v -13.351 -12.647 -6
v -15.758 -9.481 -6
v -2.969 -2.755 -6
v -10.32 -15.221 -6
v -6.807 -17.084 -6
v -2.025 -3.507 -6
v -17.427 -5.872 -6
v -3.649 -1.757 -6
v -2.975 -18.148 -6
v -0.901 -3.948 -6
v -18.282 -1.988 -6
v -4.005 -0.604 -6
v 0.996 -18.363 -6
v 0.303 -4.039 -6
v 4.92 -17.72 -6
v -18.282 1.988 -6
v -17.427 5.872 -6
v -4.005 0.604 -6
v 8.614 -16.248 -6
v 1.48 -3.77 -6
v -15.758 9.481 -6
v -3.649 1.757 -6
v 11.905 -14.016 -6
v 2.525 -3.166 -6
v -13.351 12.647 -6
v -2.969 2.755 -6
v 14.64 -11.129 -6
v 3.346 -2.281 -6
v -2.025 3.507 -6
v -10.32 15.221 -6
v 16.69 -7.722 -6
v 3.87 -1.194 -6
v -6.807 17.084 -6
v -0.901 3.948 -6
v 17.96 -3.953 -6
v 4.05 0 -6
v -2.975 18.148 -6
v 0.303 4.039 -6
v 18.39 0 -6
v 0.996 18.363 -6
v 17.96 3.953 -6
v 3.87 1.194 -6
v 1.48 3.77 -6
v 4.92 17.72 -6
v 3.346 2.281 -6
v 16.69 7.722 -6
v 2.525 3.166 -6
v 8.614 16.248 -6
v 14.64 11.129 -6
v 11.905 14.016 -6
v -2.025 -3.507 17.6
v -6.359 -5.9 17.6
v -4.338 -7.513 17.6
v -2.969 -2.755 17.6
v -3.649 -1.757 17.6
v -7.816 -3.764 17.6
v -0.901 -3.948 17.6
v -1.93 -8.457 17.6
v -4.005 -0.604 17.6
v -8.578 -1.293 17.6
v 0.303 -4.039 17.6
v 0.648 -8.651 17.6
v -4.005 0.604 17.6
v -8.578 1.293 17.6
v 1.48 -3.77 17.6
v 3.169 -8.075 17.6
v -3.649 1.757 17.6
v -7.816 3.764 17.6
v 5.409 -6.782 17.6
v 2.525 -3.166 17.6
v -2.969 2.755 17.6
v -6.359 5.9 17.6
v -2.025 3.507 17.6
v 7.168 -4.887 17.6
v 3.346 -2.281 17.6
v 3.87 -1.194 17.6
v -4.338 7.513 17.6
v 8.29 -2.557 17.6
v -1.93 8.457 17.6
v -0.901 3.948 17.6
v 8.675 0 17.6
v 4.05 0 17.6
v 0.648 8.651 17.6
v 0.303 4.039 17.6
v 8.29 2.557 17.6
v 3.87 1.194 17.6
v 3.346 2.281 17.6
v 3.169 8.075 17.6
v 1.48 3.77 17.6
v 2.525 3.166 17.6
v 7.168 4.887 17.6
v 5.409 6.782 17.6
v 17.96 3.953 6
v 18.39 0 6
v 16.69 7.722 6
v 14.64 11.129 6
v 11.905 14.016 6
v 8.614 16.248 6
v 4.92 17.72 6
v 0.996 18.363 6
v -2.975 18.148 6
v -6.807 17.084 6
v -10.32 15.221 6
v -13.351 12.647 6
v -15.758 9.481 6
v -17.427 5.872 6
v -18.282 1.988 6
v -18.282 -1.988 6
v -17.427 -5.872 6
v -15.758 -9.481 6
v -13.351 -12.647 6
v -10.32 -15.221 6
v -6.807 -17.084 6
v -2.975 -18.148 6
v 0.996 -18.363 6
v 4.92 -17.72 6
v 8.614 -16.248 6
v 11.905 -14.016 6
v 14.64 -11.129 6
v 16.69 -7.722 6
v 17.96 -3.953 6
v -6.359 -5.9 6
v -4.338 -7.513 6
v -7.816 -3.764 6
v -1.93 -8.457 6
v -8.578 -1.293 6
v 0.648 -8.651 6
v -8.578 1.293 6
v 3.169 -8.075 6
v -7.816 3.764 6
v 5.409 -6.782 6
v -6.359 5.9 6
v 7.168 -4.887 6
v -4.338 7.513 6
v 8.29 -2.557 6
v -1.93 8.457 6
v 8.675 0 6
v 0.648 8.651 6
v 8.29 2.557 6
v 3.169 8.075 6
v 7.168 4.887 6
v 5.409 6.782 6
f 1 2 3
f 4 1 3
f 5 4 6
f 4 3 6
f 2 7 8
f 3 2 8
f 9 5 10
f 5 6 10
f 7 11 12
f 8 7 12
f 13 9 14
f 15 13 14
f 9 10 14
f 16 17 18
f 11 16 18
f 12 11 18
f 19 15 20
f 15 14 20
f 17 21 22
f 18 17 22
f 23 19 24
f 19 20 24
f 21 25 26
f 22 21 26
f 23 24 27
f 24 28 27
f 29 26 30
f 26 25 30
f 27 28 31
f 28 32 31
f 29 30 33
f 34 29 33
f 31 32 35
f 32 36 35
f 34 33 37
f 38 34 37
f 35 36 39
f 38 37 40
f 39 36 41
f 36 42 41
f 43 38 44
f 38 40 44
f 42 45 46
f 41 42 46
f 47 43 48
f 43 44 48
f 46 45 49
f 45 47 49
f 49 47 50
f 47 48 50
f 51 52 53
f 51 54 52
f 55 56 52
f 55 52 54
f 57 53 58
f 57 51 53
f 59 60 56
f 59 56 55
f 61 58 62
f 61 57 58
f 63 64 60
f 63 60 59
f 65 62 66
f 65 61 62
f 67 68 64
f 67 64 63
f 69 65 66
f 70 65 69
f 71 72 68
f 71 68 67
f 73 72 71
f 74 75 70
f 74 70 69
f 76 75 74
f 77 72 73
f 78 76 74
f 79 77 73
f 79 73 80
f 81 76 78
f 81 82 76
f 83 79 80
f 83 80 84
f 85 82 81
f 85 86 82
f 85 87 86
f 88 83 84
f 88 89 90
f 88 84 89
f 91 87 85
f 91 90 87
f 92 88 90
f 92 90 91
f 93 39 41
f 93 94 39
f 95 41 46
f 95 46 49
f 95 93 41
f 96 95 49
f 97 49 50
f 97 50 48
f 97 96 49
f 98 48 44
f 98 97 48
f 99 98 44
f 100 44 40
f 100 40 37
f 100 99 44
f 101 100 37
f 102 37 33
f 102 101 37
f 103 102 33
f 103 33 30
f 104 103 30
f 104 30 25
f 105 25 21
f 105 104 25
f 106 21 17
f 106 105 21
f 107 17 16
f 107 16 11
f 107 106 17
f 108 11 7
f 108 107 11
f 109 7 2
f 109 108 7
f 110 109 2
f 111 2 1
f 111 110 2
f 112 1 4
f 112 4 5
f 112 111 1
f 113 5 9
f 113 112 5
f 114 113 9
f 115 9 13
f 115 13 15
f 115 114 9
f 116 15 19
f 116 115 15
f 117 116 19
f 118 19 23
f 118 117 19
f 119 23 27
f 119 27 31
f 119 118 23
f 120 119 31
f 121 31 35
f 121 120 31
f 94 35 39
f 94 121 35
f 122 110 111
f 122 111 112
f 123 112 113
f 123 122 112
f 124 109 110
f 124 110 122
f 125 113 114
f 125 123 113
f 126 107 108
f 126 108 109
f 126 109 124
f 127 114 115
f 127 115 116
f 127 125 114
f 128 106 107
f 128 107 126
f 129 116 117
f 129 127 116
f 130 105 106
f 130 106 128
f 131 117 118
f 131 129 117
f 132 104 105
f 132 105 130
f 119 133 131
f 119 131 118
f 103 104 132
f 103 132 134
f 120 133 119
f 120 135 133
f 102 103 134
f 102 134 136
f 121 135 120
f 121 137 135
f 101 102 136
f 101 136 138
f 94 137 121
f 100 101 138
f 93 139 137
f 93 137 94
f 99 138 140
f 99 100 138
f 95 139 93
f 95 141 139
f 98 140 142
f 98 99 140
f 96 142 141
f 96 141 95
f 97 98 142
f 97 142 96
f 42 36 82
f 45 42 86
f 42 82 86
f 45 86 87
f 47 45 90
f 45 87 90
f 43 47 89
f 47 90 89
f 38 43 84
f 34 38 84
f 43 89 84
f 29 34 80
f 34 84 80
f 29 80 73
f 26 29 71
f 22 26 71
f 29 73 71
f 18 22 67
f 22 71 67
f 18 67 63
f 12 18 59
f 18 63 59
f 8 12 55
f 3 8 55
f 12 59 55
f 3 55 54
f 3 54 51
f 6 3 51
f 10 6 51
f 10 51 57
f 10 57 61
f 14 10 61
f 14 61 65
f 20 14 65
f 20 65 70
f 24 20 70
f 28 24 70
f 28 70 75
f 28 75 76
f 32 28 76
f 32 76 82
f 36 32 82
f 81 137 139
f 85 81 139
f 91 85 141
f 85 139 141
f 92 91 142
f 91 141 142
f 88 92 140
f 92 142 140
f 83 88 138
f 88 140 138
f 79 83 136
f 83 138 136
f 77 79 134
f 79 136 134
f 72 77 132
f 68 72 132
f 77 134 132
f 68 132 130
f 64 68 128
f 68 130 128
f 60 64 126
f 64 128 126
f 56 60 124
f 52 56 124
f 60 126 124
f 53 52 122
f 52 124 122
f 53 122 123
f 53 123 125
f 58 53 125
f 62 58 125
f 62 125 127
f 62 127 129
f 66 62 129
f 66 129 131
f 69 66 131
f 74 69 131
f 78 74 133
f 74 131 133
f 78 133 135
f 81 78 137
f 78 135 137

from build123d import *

# Parameters (mm, degrees)
CROQUIS1_R              = 18.39
SALIENTE_EXTRUIR1_DEPTH = 6
CROQUIS3_R              = 8.675
SALIENTE_EXTRUIR2_DEPTH = 11.6
CROQUIS4_R              = 4.05
CORTAR_EXTRUIR1_DEPTH   = 31.6


with BuildPart() as part:
    # Croquis1 → Saliente-Extruir1 (new, symmetric)
    with BuildSketch(Plane.XY):
        Circle(CROQUIS1_R)
    extrude(amount=SALIENTE_EXTRUIR1_DEPTH, both=True)

    # Croquis3 → Saliente-Extruir2 (add)
    with BuildSketch(Plane.XY.offset(6)):
        Circle(CROQUIS3_R)
    extrude(amount=SALIENTE_EXTRUIR2_DEPTH)

    # Croquis4 → Cortar-Extruir1 (cut)
    with BuildSketch(Plane.XY.offset(17.6)):
        Circle(CROQUIS4_R)
    extrude(amount=-CORTAR_EXTRUIR1_DEPTH, mode=Mode.SUBTRACT)


solid = part.part
